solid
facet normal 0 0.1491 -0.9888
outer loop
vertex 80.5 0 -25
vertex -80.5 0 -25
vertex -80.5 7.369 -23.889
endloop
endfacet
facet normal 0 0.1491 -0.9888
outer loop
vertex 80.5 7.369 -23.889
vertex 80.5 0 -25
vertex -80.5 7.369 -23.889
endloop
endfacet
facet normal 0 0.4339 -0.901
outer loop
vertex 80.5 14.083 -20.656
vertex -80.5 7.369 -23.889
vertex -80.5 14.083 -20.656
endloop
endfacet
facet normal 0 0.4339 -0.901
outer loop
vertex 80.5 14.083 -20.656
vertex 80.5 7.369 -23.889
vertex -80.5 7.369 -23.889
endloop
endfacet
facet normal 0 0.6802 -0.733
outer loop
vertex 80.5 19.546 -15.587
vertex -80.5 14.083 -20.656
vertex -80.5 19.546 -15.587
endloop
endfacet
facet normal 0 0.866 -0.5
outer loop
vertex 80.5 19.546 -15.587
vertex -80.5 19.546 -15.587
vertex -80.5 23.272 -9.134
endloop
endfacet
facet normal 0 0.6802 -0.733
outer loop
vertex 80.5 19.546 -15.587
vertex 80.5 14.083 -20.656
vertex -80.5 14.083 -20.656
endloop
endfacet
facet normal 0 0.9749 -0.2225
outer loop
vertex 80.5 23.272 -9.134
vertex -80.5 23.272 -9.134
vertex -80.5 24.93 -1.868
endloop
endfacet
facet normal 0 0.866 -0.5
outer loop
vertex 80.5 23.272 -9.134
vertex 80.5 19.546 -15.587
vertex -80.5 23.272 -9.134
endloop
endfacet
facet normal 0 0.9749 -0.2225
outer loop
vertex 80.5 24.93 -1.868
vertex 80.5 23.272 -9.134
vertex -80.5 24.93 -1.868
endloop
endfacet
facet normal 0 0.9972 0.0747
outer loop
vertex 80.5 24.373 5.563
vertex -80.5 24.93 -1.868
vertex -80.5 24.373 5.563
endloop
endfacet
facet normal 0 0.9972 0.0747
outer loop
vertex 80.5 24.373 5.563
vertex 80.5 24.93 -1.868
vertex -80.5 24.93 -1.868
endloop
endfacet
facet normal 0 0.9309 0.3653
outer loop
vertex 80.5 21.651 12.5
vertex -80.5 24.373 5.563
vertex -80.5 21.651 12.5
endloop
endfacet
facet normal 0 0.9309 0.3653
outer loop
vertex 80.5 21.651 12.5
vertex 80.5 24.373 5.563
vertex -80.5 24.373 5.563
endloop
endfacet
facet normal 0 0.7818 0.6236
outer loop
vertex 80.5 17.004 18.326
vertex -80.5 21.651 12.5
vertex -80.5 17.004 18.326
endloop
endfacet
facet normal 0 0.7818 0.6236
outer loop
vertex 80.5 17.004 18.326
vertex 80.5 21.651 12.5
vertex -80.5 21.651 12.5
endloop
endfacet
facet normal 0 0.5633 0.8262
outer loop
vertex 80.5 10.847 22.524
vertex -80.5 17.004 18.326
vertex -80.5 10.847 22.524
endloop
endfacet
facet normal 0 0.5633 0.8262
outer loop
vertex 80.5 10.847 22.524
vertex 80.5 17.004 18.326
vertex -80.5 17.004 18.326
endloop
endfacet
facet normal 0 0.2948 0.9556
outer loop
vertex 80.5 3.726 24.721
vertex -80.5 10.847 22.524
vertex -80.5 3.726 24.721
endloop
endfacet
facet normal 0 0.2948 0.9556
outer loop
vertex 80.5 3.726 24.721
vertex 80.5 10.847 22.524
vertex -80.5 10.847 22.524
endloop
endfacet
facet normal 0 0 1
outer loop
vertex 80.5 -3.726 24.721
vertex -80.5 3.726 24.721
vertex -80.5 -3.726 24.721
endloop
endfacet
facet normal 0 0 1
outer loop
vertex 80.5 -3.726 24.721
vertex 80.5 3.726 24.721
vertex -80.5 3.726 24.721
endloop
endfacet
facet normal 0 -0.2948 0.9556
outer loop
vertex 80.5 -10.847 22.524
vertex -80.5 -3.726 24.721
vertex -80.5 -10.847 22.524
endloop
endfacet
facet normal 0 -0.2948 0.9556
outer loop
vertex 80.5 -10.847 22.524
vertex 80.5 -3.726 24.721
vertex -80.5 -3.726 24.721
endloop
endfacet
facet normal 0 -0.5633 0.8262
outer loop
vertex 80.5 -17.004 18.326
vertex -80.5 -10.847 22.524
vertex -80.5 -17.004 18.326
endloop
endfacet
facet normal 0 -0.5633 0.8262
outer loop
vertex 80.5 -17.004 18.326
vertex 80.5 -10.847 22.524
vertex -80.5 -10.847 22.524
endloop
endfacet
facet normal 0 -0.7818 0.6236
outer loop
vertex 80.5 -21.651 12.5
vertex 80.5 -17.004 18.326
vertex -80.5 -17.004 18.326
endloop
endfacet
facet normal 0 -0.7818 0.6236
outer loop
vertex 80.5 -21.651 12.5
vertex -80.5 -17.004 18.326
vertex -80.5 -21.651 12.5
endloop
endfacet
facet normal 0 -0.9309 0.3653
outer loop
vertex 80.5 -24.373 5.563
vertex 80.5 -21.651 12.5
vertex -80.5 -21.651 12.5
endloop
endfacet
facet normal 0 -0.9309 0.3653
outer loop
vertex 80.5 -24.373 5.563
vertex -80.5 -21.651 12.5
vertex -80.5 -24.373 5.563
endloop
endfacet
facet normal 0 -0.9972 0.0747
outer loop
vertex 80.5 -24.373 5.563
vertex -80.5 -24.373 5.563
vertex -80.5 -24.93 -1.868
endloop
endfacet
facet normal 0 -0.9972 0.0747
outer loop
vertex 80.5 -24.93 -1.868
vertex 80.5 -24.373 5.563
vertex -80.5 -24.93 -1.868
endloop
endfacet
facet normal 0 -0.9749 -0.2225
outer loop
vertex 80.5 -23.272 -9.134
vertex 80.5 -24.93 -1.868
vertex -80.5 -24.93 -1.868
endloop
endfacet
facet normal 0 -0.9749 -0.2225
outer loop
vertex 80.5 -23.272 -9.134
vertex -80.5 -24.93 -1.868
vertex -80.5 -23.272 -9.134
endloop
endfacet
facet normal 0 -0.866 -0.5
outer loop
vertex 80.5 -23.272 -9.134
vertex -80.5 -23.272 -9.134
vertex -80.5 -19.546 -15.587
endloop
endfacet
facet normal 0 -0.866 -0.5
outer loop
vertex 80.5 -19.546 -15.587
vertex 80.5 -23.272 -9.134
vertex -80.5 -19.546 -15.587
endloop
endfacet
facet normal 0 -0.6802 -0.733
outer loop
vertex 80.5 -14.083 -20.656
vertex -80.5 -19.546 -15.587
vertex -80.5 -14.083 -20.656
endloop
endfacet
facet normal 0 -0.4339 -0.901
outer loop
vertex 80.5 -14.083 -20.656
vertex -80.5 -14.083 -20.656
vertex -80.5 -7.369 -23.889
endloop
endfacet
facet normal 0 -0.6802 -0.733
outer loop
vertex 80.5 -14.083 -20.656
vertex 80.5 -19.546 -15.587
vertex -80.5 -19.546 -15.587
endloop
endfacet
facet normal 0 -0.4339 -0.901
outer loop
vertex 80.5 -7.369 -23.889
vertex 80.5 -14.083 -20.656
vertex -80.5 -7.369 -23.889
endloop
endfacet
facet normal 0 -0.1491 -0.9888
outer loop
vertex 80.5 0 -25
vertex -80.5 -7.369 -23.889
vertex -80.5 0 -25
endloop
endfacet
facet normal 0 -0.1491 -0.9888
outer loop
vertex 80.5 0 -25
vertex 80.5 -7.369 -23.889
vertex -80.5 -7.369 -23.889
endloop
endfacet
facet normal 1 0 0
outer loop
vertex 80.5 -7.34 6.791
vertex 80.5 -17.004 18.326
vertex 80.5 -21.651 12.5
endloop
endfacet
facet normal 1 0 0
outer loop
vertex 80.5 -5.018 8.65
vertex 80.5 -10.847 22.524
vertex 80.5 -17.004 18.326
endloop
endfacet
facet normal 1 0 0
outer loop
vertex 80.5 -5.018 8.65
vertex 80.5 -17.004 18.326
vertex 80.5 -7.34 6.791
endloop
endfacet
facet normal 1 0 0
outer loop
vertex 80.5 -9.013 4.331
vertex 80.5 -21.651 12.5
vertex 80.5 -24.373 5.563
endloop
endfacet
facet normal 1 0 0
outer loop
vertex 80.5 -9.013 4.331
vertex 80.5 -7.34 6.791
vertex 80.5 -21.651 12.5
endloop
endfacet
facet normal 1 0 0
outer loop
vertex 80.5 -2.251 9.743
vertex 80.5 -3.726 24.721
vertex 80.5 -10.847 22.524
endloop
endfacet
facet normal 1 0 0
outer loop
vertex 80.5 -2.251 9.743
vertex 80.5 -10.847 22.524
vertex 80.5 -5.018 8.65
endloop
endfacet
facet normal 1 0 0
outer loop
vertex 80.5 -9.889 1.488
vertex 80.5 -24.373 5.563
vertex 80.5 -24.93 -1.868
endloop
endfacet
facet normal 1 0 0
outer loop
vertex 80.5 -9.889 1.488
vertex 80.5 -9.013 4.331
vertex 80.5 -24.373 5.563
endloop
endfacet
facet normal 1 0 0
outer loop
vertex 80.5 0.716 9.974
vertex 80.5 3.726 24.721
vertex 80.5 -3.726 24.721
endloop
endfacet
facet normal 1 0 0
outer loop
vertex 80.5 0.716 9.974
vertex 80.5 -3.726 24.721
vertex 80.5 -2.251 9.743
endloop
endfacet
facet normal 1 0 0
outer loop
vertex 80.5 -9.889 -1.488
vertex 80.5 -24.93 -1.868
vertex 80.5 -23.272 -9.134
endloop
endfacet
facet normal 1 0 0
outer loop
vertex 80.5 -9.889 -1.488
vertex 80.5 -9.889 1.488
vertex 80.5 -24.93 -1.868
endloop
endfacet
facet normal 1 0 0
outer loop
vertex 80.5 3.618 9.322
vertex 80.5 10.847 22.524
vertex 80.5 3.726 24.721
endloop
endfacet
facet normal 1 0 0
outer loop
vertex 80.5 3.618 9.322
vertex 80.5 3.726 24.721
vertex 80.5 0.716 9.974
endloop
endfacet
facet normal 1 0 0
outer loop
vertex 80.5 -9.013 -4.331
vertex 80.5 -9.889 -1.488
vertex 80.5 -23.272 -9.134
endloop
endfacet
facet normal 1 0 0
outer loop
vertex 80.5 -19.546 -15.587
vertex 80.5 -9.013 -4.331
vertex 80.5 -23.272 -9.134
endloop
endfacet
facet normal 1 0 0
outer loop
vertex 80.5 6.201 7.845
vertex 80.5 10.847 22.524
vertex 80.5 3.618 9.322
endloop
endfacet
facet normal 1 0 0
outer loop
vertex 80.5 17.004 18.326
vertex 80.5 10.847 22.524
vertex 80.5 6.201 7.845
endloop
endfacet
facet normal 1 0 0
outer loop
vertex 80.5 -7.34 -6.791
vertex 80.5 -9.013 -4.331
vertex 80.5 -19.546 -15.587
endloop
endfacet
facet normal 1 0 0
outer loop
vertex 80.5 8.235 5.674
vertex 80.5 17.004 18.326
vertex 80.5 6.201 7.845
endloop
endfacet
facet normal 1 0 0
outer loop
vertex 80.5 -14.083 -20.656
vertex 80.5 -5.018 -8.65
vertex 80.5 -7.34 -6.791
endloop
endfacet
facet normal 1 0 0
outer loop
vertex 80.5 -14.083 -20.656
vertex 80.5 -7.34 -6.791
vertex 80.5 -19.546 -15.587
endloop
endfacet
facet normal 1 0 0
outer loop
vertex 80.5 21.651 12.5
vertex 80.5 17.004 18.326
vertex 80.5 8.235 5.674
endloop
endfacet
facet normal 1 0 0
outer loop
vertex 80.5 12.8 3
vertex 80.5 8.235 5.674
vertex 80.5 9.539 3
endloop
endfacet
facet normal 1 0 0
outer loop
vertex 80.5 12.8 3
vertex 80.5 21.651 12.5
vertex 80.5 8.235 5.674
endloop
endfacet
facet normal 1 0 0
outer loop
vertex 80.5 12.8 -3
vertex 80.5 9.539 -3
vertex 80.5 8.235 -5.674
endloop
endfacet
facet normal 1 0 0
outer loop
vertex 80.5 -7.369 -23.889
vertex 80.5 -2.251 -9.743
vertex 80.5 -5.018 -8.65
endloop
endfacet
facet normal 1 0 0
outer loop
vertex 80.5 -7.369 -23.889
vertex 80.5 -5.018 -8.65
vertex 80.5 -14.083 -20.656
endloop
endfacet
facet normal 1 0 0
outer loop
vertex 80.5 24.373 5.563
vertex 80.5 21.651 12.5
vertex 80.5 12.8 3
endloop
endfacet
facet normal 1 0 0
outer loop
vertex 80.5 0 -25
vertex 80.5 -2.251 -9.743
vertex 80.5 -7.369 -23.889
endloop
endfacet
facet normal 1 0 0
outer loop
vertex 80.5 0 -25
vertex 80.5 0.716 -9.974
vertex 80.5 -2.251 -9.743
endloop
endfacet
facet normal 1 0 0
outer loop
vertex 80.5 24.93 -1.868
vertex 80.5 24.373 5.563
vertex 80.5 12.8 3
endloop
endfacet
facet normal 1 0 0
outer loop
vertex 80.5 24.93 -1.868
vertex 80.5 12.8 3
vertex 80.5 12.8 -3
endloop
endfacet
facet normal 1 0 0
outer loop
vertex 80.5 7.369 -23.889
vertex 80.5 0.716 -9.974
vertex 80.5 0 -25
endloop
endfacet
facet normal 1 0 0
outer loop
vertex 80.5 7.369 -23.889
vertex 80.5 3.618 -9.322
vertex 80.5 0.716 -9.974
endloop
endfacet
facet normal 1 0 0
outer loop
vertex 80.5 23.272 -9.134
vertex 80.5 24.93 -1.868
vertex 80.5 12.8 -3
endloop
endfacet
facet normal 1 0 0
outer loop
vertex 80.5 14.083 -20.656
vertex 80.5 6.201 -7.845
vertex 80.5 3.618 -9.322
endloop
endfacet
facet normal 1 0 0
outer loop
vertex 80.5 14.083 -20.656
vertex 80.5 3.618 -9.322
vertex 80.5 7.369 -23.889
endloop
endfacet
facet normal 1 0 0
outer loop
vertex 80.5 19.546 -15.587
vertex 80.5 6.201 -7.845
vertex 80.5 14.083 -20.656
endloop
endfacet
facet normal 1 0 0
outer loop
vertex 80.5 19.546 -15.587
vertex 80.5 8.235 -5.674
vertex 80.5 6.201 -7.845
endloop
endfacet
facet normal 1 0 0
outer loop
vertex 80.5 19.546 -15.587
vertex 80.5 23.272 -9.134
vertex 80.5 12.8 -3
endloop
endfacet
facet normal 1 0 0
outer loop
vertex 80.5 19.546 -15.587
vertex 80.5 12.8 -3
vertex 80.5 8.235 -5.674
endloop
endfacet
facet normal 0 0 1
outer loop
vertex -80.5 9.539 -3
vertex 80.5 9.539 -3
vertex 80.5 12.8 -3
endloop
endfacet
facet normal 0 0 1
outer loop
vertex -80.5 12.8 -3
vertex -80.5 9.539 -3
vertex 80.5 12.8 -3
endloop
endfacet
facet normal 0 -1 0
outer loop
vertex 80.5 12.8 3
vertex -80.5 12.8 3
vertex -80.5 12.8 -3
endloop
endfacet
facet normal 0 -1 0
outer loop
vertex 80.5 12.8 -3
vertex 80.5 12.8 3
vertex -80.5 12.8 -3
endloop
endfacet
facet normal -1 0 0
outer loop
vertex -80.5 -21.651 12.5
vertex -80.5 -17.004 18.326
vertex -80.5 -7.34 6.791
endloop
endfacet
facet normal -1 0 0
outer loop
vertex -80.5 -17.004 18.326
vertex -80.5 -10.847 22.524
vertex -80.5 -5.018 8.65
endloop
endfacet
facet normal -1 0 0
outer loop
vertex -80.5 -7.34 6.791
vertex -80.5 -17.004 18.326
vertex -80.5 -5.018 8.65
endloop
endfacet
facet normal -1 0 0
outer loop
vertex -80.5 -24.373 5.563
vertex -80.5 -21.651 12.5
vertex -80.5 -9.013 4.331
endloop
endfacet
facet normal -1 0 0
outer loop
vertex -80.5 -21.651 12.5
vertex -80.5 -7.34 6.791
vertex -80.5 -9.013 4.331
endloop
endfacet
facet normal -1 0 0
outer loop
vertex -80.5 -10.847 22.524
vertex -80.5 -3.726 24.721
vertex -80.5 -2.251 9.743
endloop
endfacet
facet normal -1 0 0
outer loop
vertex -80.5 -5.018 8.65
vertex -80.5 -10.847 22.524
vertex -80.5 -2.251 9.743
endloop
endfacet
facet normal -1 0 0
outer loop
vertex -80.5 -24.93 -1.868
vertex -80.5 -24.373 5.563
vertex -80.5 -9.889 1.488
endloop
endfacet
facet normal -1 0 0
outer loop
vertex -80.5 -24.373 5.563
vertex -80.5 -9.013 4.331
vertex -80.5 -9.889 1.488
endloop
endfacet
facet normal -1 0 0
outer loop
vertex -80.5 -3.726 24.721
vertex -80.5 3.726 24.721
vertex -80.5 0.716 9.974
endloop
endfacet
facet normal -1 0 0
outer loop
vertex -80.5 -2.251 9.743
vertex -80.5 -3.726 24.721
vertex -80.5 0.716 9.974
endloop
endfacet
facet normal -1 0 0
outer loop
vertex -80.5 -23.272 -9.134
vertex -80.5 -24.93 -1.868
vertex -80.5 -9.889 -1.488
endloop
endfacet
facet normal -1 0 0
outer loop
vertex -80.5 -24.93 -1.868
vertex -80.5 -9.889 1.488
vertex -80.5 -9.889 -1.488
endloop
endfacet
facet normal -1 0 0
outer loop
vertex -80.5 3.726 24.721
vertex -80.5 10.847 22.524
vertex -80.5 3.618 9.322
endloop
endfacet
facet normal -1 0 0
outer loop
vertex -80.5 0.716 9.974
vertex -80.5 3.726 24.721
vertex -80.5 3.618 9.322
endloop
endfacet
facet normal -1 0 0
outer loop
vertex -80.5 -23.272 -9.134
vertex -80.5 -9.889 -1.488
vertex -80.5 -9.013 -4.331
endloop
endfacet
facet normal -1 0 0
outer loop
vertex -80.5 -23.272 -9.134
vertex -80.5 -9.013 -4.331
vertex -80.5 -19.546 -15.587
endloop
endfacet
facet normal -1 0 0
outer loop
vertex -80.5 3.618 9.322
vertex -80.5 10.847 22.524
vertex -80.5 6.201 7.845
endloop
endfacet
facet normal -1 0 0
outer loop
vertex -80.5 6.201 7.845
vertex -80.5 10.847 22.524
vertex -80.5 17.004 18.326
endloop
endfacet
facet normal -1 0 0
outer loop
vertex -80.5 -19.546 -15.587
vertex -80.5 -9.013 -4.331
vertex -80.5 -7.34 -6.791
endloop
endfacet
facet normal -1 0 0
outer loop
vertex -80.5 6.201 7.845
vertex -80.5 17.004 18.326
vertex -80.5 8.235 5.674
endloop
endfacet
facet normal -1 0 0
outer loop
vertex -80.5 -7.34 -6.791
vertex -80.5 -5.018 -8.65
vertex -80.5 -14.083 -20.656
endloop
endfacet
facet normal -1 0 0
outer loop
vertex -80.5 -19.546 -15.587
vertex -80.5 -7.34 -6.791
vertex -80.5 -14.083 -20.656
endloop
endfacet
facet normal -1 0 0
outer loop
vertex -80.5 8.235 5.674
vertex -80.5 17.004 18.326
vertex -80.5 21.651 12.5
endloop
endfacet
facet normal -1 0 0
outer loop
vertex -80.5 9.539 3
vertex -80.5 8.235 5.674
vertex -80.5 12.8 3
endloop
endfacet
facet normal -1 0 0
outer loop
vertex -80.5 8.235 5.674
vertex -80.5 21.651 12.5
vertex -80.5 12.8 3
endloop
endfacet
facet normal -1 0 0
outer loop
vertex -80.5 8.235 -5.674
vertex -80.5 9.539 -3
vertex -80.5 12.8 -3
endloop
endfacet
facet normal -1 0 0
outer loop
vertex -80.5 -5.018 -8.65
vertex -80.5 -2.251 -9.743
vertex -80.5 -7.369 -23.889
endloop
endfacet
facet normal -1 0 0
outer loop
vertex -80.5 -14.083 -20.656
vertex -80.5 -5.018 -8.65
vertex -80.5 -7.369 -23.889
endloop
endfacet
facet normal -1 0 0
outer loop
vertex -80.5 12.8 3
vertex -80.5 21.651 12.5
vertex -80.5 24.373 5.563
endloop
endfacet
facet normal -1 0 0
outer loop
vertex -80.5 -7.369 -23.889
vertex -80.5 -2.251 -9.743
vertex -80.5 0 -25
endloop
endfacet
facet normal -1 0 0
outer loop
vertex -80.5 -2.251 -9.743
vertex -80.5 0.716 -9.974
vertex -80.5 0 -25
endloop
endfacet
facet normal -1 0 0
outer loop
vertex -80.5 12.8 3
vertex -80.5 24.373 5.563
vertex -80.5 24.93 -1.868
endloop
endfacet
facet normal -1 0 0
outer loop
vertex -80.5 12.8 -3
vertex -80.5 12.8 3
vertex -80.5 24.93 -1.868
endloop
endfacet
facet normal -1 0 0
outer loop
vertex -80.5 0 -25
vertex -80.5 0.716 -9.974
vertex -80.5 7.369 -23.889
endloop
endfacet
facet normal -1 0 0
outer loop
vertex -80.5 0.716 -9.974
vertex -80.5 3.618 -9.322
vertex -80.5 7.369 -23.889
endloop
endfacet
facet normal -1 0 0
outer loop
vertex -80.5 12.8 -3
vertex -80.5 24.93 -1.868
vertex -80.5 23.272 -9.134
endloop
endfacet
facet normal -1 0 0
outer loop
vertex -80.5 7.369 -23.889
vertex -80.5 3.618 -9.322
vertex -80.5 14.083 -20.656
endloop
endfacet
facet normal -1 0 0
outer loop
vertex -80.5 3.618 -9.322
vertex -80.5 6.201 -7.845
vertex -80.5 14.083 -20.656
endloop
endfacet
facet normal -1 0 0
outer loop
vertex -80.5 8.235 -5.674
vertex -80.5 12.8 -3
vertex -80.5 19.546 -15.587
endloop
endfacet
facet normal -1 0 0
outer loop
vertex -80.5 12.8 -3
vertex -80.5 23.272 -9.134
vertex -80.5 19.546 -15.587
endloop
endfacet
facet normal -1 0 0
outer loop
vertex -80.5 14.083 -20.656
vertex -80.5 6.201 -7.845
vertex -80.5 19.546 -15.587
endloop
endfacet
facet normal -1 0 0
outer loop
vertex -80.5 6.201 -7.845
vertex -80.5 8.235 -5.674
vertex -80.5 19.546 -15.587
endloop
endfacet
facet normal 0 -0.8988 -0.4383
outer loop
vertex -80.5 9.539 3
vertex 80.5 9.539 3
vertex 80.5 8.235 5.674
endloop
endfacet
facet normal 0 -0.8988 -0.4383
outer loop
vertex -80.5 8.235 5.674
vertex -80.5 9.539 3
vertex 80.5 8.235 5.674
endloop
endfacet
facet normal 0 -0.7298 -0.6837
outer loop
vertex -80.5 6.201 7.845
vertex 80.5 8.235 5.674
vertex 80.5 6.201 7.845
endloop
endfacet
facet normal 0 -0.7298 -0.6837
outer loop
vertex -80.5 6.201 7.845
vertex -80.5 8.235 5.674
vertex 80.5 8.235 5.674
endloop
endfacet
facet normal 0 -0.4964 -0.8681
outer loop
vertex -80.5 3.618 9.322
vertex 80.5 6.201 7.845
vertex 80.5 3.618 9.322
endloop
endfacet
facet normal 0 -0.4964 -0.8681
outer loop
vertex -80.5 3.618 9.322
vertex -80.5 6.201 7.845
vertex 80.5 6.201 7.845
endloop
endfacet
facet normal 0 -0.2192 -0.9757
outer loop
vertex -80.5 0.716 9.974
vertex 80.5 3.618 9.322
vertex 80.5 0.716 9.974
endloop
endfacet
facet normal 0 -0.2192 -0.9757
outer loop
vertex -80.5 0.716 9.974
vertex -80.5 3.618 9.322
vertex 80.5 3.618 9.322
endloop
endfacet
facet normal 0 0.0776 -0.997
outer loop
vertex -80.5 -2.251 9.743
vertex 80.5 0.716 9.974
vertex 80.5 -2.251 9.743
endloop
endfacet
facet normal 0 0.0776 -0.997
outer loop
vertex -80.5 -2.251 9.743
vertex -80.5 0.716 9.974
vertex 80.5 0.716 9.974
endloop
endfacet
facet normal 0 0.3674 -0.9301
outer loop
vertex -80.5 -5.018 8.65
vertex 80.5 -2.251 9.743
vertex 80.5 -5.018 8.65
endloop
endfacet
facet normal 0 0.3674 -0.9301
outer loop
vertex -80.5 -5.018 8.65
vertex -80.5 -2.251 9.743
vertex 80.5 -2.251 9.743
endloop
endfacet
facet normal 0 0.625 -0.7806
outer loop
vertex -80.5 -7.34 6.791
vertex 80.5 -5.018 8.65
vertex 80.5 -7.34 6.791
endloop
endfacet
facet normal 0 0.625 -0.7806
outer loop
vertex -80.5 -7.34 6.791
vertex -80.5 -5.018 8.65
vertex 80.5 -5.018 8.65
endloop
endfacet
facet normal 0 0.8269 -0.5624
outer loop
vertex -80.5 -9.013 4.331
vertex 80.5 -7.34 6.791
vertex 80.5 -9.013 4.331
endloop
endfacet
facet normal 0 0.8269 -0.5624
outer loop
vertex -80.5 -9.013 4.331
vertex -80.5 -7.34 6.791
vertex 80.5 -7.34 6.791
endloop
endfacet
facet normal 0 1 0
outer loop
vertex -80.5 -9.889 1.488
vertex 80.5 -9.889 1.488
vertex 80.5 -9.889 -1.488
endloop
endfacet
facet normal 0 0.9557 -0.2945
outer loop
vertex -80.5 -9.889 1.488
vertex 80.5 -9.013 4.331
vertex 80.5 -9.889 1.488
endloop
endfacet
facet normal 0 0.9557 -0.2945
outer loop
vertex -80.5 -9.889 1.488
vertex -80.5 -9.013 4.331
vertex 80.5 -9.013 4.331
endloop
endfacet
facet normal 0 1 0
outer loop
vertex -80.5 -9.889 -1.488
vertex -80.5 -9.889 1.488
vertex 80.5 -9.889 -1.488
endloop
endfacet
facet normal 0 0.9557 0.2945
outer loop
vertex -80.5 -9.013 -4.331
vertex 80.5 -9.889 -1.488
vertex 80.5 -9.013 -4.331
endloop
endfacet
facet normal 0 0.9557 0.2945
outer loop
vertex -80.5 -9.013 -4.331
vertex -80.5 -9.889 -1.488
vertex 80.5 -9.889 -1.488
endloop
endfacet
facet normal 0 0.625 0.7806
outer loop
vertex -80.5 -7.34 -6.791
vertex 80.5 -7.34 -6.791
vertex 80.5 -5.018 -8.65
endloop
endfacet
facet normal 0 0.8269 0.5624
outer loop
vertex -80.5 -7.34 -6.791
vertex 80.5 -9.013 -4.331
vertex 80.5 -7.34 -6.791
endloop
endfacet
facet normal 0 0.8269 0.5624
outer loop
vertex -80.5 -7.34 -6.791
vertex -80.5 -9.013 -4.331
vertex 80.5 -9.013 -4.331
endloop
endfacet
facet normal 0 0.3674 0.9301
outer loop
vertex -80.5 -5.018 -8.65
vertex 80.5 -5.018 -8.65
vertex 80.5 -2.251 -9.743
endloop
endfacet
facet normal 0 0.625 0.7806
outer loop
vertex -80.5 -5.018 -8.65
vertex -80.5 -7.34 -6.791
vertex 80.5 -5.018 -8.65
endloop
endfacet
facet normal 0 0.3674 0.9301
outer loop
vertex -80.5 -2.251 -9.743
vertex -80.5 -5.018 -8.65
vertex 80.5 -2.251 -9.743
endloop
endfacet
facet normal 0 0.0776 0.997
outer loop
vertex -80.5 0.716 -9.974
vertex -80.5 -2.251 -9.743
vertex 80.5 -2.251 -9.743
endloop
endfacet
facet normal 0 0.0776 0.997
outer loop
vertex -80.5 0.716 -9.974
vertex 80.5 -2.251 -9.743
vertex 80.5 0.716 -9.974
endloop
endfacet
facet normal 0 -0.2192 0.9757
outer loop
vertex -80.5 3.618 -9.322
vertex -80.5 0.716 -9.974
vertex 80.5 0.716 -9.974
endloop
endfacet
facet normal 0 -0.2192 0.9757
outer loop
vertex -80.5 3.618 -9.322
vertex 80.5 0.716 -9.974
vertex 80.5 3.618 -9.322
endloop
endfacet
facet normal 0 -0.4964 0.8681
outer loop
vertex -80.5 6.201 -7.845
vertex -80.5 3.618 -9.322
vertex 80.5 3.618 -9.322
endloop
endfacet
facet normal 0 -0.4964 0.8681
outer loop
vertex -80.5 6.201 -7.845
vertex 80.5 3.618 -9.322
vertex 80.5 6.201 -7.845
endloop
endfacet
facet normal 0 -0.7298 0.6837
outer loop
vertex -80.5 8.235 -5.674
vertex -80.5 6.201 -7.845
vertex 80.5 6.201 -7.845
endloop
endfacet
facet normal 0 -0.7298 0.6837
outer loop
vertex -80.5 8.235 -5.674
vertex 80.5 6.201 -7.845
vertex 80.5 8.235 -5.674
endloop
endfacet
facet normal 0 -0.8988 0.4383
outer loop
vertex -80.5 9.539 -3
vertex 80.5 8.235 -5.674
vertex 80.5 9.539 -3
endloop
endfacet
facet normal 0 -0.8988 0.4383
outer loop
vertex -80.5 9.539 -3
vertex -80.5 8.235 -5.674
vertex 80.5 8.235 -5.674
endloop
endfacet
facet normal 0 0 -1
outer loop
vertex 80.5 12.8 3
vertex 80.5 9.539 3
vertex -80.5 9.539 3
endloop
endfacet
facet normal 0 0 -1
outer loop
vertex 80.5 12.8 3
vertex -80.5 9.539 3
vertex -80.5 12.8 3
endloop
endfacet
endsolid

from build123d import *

# Parameters (mm, degrees)
IZIM1_R                     = 25
IZIM1_R_2                   = 10
Y_KSEKLIK_EKSTR_ZYON1_DEPTH = 80.5
IZIM3_W                     = 6
IZIM3_H                     = 5.6
KES_EKSTR_ZYON1_DEPTH       = 80.5


with BuildPart() as part:
    # Çizim1 → Yükseklik-Ekstrüzyon1 (new, symmetric)
    with BuildSketch(Plane(origin=(0, 0, 0), x_dir=(0, 0, -1), z_dir=(1, 0, 0))):
        Circle(IZIM1_R)
        Circle(IZIM1_R_2, mode=Mode.SUBTRACT)
    extrude(amount=Y_KSEKLIK_EKSTR_ZYON1_DEPTH, both=True)

    # Çizim3 → Kes-Ekstrüzyon1 (cut, symmetric)
    with BuildSketch(Plane(origin=(0, 0, 0), x_dir=(0, 0, -1), z_dir=(1, 0, 0))):
        with Locations((0, 10)):
            Rectangle(IZIM3_W, IZIM3_H)
    extrude(amount=KES_EKSTR_ZYON1_DEPTH, both=True, mode=Mode.SUBTRACT)


solid = part.part
